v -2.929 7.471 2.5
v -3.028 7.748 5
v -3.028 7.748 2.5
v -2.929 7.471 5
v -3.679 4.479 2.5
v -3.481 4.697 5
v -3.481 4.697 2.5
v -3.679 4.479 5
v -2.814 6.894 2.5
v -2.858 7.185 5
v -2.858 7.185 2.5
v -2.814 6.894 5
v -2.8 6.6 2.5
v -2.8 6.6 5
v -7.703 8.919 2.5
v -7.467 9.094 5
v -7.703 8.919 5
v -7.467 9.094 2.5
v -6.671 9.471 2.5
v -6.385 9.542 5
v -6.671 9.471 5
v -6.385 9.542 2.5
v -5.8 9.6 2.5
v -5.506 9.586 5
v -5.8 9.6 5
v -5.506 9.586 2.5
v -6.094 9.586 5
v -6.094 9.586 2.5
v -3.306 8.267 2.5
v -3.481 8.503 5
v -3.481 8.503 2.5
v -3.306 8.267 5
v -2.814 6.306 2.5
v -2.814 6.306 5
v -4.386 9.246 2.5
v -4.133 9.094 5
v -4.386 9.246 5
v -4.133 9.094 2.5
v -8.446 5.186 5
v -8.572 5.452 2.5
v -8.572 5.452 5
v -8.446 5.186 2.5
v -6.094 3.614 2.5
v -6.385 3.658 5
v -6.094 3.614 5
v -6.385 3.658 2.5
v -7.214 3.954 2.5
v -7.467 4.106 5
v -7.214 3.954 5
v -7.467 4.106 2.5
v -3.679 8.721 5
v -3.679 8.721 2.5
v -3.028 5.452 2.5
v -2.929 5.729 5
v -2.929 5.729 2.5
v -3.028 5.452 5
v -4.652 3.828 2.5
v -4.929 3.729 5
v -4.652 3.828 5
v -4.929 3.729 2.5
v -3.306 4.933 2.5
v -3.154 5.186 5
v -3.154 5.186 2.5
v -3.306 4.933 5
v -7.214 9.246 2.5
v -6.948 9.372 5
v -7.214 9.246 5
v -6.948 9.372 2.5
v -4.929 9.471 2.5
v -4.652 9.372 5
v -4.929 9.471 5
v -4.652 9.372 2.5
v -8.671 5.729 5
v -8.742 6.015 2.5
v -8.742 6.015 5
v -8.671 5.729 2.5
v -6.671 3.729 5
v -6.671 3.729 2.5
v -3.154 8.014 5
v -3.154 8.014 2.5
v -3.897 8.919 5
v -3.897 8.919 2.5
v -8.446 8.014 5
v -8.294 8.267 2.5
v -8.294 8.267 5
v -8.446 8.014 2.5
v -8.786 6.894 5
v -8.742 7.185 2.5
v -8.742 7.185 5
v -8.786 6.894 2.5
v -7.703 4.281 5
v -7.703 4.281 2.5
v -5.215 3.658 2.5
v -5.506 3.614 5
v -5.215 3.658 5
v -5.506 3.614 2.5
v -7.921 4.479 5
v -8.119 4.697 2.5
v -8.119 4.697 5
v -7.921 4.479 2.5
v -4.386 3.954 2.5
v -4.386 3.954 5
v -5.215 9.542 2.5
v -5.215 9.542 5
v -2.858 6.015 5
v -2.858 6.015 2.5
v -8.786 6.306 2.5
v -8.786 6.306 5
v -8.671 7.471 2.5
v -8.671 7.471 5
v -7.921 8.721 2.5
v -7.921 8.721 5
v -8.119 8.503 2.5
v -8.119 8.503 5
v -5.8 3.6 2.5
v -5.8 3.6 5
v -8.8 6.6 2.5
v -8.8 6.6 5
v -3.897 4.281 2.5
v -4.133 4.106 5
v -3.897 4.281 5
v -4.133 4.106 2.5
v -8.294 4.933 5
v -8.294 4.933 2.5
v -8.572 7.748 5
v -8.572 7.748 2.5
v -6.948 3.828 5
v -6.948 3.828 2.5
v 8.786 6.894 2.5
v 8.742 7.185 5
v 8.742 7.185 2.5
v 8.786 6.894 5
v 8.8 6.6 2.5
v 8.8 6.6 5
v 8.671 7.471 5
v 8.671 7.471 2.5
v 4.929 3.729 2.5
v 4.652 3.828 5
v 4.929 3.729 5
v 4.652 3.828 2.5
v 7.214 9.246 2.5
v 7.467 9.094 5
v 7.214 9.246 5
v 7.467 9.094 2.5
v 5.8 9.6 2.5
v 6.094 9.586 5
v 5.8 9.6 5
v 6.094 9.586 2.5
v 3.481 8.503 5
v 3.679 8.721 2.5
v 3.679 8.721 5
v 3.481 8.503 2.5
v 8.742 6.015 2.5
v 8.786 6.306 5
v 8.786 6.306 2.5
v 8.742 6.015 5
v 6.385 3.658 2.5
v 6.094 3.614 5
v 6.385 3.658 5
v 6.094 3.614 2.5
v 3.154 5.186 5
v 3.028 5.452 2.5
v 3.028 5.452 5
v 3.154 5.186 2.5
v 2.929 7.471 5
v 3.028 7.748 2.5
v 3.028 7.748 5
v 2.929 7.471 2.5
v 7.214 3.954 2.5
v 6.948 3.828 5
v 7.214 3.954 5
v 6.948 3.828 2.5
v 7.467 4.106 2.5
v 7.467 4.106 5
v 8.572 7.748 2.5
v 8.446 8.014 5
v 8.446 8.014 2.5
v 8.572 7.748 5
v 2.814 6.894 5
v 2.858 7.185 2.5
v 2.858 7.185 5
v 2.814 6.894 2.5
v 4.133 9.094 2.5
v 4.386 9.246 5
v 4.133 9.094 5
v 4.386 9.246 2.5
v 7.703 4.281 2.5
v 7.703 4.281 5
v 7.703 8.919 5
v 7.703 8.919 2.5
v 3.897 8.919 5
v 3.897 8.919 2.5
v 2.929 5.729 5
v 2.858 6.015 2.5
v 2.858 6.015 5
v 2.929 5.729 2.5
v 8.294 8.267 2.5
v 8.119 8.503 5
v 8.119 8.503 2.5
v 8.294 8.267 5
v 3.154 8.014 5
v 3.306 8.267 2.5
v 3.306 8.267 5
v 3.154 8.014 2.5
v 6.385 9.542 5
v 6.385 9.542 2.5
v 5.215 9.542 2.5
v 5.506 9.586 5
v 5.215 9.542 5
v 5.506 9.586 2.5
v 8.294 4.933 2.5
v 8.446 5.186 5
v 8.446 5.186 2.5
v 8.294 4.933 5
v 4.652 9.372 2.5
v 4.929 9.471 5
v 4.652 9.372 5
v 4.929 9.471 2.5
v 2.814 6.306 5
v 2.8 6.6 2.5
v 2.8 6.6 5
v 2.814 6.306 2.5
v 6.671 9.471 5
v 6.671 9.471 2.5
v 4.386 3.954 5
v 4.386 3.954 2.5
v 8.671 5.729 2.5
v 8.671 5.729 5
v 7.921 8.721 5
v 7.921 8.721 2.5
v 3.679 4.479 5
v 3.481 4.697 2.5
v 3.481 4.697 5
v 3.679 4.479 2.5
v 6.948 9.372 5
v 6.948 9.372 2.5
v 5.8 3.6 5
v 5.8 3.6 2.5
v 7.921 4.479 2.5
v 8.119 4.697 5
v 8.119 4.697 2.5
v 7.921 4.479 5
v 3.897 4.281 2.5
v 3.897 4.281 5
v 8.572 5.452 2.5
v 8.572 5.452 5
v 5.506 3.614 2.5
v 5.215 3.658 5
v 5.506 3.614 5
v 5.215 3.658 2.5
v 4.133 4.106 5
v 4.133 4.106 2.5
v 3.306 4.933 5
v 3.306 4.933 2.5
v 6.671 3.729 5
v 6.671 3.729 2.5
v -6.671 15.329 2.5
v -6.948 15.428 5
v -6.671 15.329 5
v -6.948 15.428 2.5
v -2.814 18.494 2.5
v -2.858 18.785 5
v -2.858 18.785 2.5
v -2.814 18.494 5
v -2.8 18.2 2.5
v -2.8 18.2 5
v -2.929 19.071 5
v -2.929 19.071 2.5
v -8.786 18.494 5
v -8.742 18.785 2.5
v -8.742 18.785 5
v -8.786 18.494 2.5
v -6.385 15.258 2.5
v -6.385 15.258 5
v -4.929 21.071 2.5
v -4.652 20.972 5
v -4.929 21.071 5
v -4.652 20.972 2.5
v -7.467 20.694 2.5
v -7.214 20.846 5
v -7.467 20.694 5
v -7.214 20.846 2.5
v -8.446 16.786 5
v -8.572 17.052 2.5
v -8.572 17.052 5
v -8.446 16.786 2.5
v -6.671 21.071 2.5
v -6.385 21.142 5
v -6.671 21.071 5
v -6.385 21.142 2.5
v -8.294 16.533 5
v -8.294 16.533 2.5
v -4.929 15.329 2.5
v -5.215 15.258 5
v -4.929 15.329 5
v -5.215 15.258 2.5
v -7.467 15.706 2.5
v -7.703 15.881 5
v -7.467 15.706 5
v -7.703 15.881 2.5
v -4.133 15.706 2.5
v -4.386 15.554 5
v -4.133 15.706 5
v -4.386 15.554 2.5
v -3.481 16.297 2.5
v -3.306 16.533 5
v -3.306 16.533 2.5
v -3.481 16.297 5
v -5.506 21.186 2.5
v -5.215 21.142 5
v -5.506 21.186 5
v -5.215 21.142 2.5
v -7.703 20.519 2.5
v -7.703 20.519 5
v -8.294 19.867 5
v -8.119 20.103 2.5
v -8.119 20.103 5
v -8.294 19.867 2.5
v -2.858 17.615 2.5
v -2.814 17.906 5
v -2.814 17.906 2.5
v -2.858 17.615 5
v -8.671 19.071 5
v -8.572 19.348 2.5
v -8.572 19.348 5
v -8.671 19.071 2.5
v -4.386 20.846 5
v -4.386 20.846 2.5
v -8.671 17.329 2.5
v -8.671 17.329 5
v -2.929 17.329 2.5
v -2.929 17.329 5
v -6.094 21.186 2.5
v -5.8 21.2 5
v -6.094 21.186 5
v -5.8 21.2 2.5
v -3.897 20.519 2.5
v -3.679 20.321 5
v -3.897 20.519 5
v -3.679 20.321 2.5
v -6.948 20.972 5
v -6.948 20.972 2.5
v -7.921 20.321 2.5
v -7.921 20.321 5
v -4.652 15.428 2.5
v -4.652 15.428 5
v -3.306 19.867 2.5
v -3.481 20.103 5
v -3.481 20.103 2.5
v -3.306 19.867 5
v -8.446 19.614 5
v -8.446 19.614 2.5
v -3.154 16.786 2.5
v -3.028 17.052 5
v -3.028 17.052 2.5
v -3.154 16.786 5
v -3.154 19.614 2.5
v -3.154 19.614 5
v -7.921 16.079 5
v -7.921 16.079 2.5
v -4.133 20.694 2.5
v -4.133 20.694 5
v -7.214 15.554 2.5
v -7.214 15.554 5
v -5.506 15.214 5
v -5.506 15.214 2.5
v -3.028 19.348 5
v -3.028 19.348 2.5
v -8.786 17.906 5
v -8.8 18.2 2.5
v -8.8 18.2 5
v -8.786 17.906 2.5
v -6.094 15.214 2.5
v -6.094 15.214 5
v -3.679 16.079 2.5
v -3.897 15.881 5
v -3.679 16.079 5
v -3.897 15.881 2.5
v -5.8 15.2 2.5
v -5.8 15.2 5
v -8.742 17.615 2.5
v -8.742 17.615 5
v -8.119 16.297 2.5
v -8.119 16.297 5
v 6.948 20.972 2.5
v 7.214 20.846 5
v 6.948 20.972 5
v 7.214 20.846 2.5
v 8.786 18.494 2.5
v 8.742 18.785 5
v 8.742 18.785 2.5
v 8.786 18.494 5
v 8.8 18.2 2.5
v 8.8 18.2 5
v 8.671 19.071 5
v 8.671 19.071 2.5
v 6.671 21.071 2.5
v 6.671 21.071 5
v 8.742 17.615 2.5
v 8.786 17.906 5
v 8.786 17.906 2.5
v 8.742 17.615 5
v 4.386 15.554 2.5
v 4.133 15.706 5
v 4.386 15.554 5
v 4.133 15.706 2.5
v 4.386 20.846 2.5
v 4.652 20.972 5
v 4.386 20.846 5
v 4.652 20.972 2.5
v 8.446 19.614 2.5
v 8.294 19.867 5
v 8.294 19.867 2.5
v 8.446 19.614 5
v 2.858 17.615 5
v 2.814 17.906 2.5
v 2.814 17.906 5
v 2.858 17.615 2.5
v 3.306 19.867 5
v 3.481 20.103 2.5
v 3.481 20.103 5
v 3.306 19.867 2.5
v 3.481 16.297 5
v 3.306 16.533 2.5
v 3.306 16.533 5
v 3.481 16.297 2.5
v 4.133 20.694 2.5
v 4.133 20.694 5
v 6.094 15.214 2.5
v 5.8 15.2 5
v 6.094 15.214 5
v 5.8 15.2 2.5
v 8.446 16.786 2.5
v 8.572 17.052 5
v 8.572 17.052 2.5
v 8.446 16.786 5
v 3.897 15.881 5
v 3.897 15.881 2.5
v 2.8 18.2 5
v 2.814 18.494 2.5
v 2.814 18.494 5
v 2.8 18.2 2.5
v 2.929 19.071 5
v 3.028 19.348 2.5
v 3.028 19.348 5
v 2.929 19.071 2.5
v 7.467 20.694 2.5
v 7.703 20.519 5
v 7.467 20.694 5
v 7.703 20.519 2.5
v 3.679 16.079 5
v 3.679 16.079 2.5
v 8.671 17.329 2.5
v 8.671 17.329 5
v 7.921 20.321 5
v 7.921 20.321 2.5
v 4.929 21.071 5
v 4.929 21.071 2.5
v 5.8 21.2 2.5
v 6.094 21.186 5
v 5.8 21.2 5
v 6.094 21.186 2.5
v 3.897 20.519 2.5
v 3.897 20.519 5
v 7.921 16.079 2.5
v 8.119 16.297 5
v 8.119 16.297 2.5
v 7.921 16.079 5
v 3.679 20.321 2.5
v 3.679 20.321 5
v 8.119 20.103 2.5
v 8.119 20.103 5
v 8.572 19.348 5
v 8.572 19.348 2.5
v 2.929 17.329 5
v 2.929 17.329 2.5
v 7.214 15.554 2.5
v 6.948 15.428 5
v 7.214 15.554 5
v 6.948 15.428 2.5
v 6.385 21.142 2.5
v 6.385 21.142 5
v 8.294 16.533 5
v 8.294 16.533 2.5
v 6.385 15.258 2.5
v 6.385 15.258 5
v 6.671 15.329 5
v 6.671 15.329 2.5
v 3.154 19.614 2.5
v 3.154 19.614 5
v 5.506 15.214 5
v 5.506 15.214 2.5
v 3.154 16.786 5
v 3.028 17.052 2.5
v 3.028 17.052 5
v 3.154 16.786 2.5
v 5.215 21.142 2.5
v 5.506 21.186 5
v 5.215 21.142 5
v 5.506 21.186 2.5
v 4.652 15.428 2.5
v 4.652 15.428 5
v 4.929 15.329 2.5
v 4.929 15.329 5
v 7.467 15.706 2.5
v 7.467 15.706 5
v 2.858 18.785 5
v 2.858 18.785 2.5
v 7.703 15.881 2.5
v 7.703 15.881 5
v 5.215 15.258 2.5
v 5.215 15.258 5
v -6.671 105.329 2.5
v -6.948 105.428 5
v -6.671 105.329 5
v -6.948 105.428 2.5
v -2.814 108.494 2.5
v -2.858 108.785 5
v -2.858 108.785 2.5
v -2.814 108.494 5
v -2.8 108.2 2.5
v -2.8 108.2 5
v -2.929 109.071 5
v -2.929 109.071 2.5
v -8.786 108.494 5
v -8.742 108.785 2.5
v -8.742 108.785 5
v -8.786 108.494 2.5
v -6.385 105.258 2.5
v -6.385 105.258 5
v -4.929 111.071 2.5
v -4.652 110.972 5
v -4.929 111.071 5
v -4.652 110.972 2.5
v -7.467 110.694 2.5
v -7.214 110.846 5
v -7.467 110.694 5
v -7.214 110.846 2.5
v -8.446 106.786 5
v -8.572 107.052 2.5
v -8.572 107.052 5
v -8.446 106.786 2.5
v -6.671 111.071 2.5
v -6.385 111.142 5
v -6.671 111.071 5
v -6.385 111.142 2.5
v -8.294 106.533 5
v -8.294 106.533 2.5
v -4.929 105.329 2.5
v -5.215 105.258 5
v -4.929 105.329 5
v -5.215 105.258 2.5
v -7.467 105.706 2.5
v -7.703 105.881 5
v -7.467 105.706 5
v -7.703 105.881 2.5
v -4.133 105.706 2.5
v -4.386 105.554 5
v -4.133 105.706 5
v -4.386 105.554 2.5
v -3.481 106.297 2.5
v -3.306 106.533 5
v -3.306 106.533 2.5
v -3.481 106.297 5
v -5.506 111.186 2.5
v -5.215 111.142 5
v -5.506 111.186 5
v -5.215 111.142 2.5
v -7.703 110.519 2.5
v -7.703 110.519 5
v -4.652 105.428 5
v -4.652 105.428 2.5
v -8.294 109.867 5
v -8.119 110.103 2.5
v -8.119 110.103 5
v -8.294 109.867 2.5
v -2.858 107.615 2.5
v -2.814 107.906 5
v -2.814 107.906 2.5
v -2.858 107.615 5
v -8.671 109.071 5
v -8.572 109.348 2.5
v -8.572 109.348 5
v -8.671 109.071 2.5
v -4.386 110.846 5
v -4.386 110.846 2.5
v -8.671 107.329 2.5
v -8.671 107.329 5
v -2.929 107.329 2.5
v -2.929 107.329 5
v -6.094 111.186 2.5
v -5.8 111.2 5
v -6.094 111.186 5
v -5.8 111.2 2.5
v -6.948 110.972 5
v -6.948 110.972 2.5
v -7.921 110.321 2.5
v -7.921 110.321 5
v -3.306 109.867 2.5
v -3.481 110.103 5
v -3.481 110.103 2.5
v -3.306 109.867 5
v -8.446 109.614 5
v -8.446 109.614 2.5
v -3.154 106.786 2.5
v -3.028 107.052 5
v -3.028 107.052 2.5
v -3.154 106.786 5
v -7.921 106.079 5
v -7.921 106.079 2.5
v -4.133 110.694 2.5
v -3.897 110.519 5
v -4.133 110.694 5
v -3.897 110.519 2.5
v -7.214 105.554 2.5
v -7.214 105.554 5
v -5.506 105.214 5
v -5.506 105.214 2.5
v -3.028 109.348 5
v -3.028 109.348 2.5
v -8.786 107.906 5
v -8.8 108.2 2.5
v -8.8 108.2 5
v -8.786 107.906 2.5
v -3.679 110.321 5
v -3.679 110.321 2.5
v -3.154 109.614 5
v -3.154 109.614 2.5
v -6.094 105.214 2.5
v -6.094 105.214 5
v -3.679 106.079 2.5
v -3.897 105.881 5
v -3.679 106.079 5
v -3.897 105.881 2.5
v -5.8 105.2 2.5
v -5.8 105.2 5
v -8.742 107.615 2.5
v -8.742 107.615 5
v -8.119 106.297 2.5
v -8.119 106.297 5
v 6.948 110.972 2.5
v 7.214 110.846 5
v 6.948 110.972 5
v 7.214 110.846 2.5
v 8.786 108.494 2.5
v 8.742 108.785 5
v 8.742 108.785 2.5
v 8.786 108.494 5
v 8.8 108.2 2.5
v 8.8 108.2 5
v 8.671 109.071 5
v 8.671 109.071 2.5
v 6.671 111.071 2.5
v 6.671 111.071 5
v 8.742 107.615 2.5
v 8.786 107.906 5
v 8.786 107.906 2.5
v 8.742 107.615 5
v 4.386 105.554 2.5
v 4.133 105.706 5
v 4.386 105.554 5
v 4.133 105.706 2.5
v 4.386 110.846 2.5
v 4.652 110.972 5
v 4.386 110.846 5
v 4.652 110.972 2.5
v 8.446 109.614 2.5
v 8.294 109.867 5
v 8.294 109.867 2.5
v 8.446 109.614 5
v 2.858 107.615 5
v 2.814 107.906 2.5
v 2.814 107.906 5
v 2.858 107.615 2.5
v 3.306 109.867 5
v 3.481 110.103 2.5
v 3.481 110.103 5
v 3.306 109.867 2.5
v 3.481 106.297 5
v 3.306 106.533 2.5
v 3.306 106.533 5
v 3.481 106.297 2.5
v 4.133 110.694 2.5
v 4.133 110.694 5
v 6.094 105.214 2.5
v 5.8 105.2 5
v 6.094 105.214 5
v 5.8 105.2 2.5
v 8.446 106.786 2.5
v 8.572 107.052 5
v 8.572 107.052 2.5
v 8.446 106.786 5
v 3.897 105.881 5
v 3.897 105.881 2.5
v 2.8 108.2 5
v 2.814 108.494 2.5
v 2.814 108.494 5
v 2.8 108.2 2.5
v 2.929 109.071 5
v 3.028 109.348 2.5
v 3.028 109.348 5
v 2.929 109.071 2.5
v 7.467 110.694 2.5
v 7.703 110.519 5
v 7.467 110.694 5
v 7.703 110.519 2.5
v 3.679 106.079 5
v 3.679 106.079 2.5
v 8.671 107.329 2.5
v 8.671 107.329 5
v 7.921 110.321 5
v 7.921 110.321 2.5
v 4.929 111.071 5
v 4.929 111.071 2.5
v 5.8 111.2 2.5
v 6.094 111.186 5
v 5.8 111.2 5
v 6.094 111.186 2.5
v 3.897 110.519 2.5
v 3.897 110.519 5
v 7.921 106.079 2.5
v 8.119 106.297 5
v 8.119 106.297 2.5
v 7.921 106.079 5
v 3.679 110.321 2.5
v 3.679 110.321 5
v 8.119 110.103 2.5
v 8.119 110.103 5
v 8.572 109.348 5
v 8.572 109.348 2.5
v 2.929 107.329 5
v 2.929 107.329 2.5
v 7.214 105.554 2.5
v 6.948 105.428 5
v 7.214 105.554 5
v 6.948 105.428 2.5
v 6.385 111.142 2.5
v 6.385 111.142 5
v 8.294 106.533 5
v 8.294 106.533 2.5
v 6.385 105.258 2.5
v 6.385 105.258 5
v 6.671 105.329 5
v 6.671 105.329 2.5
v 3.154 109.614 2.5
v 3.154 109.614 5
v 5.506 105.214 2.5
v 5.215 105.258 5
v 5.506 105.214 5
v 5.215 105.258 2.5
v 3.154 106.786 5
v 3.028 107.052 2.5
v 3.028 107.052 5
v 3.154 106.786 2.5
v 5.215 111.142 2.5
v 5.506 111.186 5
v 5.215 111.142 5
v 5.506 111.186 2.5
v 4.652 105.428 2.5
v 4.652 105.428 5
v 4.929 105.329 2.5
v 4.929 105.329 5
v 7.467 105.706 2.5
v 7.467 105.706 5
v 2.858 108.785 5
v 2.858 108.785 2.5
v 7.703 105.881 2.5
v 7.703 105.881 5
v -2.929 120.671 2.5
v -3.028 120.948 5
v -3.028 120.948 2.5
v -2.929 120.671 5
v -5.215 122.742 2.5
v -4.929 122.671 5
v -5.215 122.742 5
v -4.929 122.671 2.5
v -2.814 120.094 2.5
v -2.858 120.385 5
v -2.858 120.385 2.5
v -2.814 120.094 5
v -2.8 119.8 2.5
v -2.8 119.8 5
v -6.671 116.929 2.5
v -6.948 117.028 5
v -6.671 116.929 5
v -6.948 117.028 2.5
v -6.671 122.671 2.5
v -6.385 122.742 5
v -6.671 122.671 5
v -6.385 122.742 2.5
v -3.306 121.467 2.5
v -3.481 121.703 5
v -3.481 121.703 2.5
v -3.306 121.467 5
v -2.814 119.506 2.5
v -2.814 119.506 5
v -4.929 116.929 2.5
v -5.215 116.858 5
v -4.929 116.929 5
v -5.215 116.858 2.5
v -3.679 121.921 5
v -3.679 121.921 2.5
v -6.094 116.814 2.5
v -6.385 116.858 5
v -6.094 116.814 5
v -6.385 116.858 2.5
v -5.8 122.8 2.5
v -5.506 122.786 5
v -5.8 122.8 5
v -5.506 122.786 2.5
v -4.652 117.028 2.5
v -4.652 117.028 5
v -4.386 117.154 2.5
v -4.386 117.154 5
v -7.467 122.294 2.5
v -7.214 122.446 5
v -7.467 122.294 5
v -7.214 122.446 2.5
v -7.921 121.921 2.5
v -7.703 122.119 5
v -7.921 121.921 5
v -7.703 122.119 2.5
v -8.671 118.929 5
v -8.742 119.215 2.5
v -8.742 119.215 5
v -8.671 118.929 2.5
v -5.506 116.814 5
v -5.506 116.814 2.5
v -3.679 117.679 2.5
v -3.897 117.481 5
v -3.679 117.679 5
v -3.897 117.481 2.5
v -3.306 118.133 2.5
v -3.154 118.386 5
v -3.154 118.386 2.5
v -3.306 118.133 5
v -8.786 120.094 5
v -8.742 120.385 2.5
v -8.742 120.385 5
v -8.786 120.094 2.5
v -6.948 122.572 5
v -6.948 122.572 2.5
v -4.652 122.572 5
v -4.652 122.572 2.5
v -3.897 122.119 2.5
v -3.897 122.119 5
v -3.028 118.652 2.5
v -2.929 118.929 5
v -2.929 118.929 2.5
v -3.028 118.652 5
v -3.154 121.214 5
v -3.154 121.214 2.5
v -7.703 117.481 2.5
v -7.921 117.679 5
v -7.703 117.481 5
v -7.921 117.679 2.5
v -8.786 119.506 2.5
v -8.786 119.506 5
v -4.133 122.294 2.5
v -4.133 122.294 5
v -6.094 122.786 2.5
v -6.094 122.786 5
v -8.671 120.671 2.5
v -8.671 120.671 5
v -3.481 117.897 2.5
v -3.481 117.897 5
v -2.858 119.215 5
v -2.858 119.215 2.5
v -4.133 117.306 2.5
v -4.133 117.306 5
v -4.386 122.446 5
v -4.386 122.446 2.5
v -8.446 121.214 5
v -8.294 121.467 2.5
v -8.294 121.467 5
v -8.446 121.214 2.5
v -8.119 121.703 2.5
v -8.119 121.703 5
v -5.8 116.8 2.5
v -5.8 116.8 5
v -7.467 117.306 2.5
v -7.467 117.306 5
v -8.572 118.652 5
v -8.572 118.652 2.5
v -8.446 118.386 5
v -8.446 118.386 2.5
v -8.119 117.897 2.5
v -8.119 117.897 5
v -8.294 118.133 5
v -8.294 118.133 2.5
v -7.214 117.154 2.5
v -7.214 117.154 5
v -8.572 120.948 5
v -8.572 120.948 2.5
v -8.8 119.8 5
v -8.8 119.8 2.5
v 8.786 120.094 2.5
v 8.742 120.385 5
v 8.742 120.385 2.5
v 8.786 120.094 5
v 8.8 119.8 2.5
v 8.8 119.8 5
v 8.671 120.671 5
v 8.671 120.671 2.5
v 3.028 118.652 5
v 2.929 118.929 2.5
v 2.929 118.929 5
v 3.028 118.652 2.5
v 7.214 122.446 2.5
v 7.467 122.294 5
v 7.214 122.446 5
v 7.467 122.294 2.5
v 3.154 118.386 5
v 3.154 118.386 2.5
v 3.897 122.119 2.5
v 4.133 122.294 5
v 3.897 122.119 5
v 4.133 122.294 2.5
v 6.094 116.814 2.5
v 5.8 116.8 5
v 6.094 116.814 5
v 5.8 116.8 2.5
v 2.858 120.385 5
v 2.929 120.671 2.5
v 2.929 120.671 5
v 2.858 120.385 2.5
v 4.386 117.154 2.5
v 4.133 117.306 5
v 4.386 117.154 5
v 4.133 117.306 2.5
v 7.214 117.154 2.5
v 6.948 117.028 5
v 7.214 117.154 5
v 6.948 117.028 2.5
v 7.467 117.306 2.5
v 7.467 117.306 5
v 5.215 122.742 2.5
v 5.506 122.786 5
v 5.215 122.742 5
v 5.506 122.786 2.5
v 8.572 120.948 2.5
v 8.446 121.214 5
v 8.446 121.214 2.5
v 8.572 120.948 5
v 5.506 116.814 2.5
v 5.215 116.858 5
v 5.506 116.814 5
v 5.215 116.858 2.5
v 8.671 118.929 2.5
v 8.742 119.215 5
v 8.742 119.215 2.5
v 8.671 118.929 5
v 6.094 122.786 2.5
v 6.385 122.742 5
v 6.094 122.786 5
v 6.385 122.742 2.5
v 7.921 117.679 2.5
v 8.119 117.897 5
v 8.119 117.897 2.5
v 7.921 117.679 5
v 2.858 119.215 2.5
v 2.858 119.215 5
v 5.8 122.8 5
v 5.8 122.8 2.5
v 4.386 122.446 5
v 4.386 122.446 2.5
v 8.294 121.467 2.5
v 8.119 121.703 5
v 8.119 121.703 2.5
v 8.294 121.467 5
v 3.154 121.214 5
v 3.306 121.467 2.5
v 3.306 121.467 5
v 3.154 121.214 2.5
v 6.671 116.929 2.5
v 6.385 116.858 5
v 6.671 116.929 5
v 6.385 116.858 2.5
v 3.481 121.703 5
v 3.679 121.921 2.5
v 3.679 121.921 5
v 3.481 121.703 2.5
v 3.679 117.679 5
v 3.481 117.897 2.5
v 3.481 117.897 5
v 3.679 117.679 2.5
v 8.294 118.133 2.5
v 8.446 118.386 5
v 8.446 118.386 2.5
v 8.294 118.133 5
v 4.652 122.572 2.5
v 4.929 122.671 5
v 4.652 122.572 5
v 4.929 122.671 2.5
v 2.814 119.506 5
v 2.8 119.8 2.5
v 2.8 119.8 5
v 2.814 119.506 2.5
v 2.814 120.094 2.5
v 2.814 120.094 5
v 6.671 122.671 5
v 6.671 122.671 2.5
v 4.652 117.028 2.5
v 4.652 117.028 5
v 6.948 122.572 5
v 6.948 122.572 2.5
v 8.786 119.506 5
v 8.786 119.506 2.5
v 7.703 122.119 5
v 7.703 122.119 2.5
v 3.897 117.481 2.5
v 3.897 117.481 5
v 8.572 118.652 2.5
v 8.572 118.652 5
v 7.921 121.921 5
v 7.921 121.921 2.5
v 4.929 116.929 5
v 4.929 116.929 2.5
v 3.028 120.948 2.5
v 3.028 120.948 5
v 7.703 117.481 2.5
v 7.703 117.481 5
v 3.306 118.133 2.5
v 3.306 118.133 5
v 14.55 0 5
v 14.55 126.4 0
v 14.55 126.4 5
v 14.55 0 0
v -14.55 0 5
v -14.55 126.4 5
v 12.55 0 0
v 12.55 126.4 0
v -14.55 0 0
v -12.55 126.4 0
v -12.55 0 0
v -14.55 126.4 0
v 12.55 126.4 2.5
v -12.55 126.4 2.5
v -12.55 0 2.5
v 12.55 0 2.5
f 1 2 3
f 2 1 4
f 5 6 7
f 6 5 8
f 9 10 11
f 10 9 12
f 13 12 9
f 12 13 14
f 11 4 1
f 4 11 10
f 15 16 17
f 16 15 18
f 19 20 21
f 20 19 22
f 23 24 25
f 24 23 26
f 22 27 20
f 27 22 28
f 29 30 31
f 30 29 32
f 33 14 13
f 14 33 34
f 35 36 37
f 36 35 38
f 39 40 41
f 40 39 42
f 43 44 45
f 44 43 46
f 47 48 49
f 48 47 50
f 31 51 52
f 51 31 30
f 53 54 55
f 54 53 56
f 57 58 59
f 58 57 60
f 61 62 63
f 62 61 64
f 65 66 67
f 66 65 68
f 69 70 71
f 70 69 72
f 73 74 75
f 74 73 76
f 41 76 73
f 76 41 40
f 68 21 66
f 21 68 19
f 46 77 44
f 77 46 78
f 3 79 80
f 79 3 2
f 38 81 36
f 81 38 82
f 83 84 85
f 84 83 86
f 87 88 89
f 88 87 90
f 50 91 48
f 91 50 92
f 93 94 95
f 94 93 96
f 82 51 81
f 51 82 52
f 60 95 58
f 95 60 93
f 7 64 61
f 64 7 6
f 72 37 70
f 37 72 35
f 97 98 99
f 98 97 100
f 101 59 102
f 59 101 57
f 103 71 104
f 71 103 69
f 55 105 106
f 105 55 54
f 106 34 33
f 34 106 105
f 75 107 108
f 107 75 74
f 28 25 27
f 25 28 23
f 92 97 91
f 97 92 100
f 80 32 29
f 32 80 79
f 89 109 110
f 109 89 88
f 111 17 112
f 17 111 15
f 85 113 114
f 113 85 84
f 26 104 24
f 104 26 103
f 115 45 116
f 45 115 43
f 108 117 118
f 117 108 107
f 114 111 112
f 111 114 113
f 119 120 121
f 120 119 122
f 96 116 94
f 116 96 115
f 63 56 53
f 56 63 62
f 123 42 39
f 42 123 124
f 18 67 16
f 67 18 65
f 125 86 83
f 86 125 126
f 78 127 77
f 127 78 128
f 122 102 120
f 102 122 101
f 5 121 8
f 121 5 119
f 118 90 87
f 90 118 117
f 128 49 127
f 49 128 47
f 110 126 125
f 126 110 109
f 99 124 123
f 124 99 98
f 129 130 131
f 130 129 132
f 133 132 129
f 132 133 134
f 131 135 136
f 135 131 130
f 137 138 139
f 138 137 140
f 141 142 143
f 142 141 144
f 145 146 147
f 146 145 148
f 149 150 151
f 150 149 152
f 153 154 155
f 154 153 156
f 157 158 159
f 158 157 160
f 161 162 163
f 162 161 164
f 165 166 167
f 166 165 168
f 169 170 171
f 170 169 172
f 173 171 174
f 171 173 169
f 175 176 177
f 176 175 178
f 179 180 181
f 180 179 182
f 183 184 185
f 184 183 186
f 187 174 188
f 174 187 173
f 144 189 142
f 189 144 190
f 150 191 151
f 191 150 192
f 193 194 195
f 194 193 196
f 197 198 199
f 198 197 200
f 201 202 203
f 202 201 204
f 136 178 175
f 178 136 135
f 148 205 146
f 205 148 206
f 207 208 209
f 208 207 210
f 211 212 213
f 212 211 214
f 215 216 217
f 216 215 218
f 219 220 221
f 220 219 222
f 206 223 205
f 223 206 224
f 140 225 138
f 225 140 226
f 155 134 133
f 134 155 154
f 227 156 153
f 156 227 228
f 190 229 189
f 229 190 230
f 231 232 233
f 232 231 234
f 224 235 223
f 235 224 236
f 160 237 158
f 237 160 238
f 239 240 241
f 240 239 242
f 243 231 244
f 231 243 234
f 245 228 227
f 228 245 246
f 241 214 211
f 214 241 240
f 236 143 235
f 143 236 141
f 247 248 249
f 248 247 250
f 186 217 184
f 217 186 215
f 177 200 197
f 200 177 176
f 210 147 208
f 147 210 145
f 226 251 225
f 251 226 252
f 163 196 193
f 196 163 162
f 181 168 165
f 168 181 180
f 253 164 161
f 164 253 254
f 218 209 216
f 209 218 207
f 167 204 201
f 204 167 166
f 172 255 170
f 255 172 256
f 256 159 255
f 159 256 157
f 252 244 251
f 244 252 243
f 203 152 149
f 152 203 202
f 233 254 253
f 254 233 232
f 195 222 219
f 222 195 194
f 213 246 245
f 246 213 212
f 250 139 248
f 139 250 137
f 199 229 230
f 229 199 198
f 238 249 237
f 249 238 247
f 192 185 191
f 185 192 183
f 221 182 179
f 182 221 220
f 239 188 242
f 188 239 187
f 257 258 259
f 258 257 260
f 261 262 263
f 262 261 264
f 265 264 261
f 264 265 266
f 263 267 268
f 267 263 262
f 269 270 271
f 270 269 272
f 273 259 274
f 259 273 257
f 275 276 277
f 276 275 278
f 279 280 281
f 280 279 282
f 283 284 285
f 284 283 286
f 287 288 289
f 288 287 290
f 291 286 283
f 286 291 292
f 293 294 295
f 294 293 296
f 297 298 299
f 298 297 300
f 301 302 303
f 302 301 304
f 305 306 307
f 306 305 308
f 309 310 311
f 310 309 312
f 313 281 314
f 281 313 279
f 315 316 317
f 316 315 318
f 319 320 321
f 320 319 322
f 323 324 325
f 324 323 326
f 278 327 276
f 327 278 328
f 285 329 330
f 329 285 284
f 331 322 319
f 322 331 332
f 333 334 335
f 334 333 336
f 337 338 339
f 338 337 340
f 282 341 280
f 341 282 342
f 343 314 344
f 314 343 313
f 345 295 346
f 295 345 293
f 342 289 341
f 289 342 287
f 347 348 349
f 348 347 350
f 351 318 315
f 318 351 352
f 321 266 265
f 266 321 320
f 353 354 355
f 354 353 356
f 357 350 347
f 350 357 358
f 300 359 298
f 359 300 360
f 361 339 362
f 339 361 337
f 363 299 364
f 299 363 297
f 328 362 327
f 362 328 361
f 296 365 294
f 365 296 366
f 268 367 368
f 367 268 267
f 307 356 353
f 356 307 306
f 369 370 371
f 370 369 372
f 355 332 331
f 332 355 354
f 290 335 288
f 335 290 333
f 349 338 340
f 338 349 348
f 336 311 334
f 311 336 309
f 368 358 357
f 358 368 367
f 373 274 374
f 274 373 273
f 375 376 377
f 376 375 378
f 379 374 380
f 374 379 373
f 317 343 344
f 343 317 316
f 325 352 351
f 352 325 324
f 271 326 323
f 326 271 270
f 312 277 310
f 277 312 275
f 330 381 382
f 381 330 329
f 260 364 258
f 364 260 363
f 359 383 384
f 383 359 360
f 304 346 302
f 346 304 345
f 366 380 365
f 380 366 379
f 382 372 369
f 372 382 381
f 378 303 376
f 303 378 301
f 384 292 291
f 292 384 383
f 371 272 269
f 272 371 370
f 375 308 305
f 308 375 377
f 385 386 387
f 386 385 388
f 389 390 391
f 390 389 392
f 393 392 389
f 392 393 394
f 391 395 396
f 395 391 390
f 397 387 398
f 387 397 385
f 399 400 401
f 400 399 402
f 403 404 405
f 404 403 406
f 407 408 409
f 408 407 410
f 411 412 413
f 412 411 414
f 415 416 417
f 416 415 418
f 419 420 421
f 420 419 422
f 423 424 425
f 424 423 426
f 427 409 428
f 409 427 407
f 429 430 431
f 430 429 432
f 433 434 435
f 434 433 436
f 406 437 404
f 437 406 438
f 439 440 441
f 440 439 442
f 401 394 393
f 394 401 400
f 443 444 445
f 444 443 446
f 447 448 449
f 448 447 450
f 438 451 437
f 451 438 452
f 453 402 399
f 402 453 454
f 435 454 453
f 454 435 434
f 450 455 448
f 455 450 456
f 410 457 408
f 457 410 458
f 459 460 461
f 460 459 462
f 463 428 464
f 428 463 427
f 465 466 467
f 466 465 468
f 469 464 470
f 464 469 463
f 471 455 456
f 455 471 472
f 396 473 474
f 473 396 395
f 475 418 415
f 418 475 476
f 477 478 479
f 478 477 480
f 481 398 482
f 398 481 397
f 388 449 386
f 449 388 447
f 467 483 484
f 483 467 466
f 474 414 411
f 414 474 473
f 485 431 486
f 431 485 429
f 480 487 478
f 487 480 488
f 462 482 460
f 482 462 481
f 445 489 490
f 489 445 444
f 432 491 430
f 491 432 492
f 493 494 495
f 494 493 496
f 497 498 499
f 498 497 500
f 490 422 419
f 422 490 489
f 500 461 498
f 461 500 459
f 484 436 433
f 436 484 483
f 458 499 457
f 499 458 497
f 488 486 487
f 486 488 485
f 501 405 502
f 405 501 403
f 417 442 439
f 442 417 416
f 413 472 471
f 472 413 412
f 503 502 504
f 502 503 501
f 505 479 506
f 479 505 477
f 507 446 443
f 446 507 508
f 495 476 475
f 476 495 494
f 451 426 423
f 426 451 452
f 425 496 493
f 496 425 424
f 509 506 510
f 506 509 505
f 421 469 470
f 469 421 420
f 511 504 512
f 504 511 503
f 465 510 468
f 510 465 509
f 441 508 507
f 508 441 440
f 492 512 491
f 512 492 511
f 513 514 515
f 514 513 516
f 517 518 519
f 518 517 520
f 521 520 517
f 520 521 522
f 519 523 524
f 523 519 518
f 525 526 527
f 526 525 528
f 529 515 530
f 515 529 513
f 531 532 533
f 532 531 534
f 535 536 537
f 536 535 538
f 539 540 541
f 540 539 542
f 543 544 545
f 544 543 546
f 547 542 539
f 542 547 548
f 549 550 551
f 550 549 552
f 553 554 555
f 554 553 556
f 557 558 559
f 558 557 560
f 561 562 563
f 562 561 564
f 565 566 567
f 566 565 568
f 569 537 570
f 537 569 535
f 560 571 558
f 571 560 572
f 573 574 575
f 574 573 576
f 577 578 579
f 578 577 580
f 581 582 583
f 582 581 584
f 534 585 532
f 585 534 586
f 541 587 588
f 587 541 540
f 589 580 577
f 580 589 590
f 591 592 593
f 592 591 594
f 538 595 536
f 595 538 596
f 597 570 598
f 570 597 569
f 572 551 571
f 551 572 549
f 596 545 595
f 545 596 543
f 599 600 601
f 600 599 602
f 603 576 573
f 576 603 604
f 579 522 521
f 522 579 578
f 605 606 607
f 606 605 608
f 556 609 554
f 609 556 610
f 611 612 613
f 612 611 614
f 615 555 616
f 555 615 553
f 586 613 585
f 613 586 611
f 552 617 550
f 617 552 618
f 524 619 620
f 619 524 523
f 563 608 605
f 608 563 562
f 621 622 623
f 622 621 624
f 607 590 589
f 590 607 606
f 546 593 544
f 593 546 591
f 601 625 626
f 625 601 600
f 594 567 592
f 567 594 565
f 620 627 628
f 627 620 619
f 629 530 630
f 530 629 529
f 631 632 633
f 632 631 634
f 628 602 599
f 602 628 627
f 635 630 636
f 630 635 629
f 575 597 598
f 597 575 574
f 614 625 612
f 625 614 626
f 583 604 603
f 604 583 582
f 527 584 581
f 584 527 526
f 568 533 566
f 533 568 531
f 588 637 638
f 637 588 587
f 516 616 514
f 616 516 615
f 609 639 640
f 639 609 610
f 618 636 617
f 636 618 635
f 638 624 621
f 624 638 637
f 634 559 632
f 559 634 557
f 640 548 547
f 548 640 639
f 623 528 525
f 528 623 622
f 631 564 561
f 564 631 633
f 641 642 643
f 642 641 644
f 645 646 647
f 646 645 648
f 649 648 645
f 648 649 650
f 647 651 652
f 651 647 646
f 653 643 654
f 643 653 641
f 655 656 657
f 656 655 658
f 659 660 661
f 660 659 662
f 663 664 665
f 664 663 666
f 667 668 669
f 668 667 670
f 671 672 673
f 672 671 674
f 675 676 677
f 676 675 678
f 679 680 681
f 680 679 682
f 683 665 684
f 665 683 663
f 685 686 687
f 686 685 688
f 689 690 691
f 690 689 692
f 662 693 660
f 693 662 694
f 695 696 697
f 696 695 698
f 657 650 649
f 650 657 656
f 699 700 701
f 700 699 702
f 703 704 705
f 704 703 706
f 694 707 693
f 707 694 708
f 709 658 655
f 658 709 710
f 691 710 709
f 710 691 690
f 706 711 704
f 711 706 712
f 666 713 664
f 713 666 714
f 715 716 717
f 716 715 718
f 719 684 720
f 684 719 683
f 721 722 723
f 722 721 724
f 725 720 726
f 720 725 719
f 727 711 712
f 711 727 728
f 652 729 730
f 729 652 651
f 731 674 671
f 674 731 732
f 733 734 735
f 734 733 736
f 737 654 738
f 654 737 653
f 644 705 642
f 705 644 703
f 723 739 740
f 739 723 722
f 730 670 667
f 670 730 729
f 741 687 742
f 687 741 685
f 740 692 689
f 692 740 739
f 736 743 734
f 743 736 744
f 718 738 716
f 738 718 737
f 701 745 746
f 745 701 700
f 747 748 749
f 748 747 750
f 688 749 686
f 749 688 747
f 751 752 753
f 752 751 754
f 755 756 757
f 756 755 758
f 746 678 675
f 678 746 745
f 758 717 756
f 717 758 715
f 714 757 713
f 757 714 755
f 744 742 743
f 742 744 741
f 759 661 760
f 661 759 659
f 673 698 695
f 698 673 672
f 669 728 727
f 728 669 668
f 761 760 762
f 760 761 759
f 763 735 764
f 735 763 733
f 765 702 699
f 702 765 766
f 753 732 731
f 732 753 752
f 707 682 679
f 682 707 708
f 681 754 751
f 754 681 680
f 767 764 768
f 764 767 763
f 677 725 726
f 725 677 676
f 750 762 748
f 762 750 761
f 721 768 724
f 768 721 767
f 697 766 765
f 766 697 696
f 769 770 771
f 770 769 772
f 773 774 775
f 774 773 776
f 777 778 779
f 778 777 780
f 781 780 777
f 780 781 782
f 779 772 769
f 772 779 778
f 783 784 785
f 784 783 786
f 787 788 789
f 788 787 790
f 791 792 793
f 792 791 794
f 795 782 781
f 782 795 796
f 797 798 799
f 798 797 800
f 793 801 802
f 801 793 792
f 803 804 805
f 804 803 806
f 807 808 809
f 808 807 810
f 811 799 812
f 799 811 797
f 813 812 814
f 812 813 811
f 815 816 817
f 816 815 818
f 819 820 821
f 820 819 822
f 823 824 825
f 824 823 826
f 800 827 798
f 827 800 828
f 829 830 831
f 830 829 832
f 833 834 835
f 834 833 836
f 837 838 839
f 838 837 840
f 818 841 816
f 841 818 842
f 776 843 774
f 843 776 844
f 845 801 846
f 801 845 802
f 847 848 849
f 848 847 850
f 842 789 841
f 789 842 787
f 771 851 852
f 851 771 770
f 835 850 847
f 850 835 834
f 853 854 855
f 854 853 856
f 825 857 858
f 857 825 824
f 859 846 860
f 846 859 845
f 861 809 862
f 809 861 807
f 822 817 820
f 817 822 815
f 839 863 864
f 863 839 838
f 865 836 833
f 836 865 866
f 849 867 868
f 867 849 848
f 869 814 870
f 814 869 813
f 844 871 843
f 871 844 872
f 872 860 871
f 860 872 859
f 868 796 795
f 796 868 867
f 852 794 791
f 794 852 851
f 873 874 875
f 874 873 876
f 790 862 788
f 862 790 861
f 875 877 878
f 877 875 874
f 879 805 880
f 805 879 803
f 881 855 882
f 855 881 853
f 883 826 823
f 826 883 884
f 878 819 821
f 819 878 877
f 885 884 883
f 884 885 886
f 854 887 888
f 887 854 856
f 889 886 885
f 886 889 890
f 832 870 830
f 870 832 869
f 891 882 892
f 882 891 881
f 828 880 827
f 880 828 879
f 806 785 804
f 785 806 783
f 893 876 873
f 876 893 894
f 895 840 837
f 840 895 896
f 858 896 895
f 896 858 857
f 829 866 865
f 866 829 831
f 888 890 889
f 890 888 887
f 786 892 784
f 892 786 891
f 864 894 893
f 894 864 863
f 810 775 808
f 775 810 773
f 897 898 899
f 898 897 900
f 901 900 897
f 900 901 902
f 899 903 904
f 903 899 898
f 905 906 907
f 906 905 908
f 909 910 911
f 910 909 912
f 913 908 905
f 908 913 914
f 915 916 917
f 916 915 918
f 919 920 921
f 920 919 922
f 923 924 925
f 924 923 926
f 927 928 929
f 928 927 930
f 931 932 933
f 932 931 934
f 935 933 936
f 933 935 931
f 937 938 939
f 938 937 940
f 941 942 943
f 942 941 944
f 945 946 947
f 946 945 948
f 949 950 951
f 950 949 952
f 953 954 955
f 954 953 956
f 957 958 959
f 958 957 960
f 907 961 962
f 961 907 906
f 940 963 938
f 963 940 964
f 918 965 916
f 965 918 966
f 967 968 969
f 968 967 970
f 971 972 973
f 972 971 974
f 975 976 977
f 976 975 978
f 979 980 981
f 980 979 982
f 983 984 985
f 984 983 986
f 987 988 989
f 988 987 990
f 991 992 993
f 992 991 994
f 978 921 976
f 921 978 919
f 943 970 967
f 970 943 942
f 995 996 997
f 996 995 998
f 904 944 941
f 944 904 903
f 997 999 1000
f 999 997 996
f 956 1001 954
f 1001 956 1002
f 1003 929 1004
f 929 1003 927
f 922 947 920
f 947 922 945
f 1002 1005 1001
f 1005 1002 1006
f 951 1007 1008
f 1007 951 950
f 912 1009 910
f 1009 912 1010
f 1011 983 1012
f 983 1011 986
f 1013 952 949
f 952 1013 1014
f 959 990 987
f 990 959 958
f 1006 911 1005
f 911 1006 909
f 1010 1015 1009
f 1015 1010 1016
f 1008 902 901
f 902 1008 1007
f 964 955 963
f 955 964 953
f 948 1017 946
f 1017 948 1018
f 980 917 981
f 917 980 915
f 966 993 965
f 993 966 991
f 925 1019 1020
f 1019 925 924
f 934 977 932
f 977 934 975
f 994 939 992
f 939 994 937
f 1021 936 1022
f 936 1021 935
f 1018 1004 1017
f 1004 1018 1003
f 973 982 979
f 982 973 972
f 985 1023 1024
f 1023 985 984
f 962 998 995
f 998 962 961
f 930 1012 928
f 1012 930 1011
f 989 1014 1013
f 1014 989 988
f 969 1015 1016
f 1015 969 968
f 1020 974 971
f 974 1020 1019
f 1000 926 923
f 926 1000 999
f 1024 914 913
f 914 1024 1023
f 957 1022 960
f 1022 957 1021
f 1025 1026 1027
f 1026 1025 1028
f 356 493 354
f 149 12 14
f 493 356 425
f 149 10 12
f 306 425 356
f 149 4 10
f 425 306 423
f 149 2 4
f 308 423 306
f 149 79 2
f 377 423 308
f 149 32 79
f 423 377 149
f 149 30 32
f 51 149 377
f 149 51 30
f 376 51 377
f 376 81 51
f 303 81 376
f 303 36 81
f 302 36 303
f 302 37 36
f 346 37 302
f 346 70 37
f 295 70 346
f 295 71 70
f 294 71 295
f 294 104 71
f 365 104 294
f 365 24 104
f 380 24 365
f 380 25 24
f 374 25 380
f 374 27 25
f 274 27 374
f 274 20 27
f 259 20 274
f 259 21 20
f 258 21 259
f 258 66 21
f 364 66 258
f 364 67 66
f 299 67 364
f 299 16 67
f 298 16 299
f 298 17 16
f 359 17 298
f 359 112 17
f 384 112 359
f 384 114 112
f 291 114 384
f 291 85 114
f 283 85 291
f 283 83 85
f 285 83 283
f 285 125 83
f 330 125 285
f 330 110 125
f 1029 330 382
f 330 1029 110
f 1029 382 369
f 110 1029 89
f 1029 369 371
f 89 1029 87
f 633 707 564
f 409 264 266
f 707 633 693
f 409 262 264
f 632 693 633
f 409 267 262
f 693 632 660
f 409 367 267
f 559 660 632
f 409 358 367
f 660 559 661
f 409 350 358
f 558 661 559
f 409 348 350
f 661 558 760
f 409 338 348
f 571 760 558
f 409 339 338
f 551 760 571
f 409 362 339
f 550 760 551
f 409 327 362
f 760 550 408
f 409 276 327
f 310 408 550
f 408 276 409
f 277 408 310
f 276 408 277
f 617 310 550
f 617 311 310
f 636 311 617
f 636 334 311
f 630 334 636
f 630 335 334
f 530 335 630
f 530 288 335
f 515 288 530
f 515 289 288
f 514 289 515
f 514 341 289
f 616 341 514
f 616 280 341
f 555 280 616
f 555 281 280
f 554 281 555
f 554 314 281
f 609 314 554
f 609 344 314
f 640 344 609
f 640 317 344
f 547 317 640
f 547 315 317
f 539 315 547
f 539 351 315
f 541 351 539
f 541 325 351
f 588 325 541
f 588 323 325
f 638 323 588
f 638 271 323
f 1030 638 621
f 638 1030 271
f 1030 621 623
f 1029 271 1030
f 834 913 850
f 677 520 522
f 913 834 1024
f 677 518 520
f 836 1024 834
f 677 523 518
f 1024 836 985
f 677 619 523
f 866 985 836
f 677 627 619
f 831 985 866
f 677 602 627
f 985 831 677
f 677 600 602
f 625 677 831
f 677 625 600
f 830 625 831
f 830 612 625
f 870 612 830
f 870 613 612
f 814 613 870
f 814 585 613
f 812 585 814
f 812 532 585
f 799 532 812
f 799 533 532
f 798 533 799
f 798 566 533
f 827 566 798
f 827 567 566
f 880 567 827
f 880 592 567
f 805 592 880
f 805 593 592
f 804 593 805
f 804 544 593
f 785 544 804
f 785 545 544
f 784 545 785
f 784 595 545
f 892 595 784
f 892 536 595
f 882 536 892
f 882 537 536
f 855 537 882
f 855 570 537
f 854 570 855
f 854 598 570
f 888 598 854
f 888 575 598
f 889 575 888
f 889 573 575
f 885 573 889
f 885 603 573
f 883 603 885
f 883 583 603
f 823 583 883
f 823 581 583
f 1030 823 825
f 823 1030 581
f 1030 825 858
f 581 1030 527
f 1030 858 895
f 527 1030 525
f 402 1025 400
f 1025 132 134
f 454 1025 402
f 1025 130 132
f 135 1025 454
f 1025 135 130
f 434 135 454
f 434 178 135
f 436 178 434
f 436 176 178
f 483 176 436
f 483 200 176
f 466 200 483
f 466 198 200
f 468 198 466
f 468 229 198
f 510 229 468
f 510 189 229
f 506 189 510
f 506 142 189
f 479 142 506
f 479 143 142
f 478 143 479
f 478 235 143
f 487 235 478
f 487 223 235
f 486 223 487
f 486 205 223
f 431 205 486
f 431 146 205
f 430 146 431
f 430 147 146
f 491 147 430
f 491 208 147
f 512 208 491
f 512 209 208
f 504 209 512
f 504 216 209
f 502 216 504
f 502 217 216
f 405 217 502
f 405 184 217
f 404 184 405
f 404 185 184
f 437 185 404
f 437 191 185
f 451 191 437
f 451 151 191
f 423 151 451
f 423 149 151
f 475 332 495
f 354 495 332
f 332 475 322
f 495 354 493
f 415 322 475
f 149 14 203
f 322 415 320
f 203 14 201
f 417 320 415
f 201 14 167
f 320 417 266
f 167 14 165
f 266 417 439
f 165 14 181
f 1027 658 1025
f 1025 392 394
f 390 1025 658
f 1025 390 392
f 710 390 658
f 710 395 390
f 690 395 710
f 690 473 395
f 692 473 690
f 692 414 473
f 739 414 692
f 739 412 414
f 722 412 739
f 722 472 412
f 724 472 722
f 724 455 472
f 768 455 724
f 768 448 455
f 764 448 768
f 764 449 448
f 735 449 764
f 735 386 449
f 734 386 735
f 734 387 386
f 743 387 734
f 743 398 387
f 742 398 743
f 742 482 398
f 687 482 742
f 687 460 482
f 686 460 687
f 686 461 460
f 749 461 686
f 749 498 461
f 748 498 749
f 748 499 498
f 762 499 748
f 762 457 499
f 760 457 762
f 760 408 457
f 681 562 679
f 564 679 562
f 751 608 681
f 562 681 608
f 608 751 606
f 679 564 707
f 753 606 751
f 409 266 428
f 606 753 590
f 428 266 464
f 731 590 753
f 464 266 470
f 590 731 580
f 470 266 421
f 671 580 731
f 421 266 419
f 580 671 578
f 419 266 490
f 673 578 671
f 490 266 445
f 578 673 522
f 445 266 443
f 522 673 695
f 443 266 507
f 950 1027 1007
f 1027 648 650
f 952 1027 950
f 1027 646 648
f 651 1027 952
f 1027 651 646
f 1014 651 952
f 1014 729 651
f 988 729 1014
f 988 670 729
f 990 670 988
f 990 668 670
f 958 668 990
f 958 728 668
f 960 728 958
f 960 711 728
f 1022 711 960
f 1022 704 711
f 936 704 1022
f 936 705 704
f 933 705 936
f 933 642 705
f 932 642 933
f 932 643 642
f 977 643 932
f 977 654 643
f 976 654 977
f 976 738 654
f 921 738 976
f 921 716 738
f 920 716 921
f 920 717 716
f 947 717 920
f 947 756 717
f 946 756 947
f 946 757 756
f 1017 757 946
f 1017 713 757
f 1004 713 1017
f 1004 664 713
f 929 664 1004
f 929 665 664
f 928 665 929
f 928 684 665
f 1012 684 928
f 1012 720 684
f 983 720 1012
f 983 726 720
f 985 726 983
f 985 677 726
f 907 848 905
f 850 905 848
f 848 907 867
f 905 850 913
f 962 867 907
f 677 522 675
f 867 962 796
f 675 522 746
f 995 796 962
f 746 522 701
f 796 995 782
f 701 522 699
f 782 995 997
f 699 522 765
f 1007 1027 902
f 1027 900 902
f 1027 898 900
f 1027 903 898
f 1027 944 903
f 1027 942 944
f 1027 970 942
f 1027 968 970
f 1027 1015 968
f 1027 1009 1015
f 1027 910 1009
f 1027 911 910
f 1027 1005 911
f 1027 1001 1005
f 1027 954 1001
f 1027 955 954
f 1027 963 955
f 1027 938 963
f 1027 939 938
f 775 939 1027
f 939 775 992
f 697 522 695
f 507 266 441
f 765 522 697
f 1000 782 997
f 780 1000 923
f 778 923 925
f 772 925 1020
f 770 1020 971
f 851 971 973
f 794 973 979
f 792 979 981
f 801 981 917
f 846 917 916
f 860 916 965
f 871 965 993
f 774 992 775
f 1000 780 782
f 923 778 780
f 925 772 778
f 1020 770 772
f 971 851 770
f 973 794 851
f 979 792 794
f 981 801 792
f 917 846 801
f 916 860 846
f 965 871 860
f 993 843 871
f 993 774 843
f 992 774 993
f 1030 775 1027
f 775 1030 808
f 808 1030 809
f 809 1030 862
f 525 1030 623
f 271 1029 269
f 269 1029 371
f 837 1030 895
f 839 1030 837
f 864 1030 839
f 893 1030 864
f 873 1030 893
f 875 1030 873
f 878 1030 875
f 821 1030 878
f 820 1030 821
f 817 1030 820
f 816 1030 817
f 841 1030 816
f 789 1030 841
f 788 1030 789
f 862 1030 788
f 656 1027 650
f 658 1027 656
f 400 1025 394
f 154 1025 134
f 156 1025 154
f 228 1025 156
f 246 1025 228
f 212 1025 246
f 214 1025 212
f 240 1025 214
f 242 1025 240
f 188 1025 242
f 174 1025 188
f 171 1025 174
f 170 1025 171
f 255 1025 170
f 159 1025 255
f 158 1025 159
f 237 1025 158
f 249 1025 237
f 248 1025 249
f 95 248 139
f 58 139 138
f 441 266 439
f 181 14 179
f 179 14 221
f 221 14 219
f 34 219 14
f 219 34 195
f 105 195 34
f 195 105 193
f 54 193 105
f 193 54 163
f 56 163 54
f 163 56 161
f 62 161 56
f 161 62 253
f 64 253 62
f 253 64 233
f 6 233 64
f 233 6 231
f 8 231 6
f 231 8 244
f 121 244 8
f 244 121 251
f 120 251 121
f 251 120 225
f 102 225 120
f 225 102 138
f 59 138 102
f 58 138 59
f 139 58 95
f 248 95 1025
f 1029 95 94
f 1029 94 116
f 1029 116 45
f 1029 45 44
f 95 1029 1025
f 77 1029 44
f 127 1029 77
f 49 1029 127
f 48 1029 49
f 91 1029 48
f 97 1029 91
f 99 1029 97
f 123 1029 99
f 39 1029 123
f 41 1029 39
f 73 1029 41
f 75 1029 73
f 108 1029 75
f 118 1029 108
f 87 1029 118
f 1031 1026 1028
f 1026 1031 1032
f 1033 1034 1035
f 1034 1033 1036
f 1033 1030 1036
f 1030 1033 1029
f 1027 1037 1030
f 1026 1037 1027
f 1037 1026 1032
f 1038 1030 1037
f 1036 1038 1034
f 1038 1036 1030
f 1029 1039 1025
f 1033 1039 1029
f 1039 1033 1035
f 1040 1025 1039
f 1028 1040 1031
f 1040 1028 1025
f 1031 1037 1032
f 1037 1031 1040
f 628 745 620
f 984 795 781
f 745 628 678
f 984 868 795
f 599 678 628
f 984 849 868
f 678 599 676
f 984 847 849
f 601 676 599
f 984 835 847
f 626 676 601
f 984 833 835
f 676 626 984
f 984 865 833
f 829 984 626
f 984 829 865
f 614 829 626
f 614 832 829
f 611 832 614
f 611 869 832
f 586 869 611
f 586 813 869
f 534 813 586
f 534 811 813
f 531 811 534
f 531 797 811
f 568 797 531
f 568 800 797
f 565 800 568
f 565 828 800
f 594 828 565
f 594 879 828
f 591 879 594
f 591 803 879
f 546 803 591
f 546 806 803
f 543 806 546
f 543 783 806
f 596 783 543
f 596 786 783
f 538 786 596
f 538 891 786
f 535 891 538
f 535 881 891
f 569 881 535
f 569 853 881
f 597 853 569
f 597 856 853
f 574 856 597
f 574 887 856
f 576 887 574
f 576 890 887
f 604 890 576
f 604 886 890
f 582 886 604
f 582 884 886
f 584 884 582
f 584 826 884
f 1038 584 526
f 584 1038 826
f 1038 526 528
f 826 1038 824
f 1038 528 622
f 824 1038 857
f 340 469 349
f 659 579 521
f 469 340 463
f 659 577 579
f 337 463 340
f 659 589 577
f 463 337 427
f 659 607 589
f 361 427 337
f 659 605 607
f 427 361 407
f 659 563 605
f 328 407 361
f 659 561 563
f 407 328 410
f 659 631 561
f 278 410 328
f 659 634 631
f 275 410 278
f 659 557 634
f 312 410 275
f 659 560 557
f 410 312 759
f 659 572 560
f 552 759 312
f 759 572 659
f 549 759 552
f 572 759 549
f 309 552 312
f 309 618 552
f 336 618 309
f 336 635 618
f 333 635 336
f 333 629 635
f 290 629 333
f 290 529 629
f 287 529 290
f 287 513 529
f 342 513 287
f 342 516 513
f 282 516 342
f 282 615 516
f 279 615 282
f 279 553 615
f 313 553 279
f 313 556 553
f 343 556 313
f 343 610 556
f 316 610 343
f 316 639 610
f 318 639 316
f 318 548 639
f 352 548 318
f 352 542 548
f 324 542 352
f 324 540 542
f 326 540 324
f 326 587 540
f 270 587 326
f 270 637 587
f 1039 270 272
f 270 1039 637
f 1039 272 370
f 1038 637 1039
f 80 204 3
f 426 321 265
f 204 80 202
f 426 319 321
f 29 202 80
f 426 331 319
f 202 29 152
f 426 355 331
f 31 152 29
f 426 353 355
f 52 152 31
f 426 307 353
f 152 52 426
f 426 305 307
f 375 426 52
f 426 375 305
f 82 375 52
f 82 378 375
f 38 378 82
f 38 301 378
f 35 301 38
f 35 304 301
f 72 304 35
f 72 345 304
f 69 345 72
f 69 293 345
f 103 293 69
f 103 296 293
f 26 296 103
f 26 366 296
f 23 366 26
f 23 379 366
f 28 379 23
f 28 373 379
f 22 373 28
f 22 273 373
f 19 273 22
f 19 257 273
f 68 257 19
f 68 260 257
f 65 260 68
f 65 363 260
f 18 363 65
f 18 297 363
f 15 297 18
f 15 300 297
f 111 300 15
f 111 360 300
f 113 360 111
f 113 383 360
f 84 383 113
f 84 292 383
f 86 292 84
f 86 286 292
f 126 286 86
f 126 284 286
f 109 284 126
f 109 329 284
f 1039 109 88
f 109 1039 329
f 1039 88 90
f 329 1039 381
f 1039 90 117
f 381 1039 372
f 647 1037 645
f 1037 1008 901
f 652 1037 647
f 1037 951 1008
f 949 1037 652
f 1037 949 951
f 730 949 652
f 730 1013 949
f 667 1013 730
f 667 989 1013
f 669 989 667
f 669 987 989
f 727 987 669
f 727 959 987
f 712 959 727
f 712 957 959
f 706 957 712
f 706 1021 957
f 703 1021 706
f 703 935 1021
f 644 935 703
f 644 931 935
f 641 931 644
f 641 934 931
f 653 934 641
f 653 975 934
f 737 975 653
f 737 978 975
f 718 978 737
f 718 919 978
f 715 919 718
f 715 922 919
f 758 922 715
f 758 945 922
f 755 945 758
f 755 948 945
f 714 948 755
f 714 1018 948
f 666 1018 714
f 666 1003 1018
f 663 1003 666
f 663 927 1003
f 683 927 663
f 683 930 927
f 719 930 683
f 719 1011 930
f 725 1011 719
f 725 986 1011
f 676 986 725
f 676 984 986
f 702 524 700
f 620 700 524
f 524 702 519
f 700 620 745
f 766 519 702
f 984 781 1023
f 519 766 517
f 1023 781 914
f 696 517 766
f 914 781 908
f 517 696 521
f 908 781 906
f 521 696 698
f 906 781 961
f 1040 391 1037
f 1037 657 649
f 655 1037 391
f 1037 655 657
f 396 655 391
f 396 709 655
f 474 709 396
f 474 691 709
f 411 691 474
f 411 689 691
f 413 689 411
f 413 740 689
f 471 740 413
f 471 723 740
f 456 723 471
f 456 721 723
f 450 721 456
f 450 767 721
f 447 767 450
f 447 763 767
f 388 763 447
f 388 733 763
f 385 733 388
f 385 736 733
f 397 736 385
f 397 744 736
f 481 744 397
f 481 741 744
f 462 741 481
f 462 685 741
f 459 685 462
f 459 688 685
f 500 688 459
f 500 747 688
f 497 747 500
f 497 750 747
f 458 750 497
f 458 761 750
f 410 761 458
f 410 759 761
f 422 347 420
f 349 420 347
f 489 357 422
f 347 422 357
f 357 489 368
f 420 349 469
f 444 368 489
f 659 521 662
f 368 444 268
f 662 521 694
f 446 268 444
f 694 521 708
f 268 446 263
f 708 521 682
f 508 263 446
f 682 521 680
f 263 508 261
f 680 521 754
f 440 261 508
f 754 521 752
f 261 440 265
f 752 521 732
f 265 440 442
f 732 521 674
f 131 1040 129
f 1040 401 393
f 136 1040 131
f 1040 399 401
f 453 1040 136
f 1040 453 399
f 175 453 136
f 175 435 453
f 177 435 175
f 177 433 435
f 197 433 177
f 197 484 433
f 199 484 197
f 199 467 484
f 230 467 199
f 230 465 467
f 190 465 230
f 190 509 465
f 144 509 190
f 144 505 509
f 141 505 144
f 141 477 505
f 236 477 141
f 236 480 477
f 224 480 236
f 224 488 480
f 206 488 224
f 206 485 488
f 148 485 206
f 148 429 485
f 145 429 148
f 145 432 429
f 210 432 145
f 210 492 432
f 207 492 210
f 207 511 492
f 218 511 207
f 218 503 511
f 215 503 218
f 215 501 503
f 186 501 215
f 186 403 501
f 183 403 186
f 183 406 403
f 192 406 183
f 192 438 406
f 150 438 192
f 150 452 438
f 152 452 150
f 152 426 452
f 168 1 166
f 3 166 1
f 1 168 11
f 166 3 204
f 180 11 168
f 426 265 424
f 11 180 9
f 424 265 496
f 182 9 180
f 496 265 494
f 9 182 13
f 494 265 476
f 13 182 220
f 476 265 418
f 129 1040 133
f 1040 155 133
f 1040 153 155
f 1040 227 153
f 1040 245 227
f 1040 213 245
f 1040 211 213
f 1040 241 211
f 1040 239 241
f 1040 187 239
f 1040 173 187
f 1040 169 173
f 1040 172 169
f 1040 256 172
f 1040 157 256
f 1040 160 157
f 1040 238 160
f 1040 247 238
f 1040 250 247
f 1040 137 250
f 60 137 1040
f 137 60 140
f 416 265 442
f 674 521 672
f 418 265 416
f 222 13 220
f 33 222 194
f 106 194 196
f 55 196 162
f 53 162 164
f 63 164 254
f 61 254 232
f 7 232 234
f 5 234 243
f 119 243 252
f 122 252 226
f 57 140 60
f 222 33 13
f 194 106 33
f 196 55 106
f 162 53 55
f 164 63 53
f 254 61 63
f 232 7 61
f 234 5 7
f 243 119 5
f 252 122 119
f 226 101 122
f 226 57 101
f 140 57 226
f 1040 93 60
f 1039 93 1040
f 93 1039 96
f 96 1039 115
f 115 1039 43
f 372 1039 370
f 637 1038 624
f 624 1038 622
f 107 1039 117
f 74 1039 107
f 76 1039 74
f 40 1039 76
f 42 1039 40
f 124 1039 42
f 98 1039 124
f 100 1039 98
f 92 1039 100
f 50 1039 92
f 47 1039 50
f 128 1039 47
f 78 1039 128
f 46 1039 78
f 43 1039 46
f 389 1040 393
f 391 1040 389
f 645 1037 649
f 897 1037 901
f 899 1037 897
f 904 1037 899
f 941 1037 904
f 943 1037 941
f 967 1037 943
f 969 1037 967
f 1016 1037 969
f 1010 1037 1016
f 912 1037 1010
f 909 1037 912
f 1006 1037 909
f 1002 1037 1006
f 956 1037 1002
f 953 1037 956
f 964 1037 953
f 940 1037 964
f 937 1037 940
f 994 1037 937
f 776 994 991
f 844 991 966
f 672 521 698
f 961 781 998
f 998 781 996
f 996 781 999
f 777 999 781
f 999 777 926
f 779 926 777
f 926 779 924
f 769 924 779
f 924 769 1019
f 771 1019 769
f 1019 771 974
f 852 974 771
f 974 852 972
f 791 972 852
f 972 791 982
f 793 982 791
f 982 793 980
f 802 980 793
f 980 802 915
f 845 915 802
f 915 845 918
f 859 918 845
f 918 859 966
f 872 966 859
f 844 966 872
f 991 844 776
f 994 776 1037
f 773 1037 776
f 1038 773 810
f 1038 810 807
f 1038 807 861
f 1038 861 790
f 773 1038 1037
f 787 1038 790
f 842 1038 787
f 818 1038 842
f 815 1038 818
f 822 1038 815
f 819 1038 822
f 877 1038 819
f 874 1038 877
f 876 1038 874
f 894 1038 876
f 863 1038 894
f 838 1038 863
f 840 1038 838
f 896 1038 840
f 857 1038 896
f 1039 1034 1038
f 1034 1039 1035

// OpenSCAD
// file: lib/leash-jig.scad
// Copyright (c) 2026 mmmaxwwwell
// Licensed under CC BY-NC-ND 4.0, https://creativecommons.org/licenses/by-nc-nd/4.0/
//
// Shared geometry for BioThane leash hole-punch jigs.
// One channel-cross-section, any length, with 2-hole rows at arbitrary Y
// positions. A "4-hole square" is just two rows 11.6mm apart.

// ===== Strap =====
strap_width      = 24.8;
strap_thickness  = 2.5;

// ===== Chicago screw / hole pattern =====
// Holes are 6mm but caps are 10mm, so spacing is driven by cap geometry.
//   3*gap + 2*cap_d = strap_width  →  gap = 1.6mm
hole_d           = 6.0;
cap_d            = 10.0;
gap              = (strap_width - 2 * cap_d) / 3;   // 1.6 mm
hole_pitch       = cap_d + gap;                     // 11.6 mm, center-to-center
edge_to_center   = gap + cap_d / 2;                 //  6.6 mm

// ===== Jig cross-section =====
wall              = 2.0;
jig_thickness     = 2 * strap_thickness;            // 5 mm
channel_clearance = 0.3;
channel_w         = strap_width + channel_clearance;
channel_d         = strap_thickness;
jig_w             = channel_w + 2 * wall;

inch              = 25.4;
eps               = 0.01;

// Punch jig with a 2-hole row at every Y in `hole_ys`.
// Holes sit at X = ±hole_pitch/2 (centered in the channel).
// Channel opens DOWNWARD (toward Z=0, the build plate).
module leash_jig(length, hole_ys) {
    difference() {
        translate([-jig_w/2, 0, 0])
            cube([jig_w, length, jig_thickness]);

        // Strap channel — open on both Y ends; opens DOWNWARD (Z=0 face)
        translate([-channel_w/2, -eps, -eps])
            cube([channel_w, length + 2*eps, channel_d + eps]);

        // Punch-guide holes
        for (y = hole_ys)
            for (x = [-hole_pitch/2, hole_pitch/2])
                translate([x, y, -eps])
                    cylinder(d = hole_d, h = jig_thickness + 2*eps);
    }
}
// main file
// Copyright (c) 2026 mmmaxwwwell
// Licensed under CC BY-NC-ND 4.0, https://creativecommons.org/licenses/by-nc-nd/4.0/
//
// 2-foot leash, cobra-buckle end. Two 4-hole squares:
//   - end square flush with the strap end
//   - second square with its inner edge 4" from the end

include <lib/leash-jig.scad>

$fn = 64;

inner_edge_in = 4;
inner_edge = inner_edge_in * inch;                       // 101.6

// End square hole Ys
end_y0 = edge_to_center;                                 //   6.6
end_y1 = edge_to_center + hole_pitch;                    //  18.2

// Second square: first row at inner_edge + edge_to_center; second row + pitch
sec_y0 = inner_edge + edge_to_center;                    // 108.2
sec_y1 = inner_edge + edge_to_center + hole_pitch;       // 119.8

jig_len = sec_y1 + edge_to_center;                       // 126.4

leash_jig(
    length  = jig_len,
    hole_ys = [end_y0, end_y1, sec_y0, sec_y1]
);
